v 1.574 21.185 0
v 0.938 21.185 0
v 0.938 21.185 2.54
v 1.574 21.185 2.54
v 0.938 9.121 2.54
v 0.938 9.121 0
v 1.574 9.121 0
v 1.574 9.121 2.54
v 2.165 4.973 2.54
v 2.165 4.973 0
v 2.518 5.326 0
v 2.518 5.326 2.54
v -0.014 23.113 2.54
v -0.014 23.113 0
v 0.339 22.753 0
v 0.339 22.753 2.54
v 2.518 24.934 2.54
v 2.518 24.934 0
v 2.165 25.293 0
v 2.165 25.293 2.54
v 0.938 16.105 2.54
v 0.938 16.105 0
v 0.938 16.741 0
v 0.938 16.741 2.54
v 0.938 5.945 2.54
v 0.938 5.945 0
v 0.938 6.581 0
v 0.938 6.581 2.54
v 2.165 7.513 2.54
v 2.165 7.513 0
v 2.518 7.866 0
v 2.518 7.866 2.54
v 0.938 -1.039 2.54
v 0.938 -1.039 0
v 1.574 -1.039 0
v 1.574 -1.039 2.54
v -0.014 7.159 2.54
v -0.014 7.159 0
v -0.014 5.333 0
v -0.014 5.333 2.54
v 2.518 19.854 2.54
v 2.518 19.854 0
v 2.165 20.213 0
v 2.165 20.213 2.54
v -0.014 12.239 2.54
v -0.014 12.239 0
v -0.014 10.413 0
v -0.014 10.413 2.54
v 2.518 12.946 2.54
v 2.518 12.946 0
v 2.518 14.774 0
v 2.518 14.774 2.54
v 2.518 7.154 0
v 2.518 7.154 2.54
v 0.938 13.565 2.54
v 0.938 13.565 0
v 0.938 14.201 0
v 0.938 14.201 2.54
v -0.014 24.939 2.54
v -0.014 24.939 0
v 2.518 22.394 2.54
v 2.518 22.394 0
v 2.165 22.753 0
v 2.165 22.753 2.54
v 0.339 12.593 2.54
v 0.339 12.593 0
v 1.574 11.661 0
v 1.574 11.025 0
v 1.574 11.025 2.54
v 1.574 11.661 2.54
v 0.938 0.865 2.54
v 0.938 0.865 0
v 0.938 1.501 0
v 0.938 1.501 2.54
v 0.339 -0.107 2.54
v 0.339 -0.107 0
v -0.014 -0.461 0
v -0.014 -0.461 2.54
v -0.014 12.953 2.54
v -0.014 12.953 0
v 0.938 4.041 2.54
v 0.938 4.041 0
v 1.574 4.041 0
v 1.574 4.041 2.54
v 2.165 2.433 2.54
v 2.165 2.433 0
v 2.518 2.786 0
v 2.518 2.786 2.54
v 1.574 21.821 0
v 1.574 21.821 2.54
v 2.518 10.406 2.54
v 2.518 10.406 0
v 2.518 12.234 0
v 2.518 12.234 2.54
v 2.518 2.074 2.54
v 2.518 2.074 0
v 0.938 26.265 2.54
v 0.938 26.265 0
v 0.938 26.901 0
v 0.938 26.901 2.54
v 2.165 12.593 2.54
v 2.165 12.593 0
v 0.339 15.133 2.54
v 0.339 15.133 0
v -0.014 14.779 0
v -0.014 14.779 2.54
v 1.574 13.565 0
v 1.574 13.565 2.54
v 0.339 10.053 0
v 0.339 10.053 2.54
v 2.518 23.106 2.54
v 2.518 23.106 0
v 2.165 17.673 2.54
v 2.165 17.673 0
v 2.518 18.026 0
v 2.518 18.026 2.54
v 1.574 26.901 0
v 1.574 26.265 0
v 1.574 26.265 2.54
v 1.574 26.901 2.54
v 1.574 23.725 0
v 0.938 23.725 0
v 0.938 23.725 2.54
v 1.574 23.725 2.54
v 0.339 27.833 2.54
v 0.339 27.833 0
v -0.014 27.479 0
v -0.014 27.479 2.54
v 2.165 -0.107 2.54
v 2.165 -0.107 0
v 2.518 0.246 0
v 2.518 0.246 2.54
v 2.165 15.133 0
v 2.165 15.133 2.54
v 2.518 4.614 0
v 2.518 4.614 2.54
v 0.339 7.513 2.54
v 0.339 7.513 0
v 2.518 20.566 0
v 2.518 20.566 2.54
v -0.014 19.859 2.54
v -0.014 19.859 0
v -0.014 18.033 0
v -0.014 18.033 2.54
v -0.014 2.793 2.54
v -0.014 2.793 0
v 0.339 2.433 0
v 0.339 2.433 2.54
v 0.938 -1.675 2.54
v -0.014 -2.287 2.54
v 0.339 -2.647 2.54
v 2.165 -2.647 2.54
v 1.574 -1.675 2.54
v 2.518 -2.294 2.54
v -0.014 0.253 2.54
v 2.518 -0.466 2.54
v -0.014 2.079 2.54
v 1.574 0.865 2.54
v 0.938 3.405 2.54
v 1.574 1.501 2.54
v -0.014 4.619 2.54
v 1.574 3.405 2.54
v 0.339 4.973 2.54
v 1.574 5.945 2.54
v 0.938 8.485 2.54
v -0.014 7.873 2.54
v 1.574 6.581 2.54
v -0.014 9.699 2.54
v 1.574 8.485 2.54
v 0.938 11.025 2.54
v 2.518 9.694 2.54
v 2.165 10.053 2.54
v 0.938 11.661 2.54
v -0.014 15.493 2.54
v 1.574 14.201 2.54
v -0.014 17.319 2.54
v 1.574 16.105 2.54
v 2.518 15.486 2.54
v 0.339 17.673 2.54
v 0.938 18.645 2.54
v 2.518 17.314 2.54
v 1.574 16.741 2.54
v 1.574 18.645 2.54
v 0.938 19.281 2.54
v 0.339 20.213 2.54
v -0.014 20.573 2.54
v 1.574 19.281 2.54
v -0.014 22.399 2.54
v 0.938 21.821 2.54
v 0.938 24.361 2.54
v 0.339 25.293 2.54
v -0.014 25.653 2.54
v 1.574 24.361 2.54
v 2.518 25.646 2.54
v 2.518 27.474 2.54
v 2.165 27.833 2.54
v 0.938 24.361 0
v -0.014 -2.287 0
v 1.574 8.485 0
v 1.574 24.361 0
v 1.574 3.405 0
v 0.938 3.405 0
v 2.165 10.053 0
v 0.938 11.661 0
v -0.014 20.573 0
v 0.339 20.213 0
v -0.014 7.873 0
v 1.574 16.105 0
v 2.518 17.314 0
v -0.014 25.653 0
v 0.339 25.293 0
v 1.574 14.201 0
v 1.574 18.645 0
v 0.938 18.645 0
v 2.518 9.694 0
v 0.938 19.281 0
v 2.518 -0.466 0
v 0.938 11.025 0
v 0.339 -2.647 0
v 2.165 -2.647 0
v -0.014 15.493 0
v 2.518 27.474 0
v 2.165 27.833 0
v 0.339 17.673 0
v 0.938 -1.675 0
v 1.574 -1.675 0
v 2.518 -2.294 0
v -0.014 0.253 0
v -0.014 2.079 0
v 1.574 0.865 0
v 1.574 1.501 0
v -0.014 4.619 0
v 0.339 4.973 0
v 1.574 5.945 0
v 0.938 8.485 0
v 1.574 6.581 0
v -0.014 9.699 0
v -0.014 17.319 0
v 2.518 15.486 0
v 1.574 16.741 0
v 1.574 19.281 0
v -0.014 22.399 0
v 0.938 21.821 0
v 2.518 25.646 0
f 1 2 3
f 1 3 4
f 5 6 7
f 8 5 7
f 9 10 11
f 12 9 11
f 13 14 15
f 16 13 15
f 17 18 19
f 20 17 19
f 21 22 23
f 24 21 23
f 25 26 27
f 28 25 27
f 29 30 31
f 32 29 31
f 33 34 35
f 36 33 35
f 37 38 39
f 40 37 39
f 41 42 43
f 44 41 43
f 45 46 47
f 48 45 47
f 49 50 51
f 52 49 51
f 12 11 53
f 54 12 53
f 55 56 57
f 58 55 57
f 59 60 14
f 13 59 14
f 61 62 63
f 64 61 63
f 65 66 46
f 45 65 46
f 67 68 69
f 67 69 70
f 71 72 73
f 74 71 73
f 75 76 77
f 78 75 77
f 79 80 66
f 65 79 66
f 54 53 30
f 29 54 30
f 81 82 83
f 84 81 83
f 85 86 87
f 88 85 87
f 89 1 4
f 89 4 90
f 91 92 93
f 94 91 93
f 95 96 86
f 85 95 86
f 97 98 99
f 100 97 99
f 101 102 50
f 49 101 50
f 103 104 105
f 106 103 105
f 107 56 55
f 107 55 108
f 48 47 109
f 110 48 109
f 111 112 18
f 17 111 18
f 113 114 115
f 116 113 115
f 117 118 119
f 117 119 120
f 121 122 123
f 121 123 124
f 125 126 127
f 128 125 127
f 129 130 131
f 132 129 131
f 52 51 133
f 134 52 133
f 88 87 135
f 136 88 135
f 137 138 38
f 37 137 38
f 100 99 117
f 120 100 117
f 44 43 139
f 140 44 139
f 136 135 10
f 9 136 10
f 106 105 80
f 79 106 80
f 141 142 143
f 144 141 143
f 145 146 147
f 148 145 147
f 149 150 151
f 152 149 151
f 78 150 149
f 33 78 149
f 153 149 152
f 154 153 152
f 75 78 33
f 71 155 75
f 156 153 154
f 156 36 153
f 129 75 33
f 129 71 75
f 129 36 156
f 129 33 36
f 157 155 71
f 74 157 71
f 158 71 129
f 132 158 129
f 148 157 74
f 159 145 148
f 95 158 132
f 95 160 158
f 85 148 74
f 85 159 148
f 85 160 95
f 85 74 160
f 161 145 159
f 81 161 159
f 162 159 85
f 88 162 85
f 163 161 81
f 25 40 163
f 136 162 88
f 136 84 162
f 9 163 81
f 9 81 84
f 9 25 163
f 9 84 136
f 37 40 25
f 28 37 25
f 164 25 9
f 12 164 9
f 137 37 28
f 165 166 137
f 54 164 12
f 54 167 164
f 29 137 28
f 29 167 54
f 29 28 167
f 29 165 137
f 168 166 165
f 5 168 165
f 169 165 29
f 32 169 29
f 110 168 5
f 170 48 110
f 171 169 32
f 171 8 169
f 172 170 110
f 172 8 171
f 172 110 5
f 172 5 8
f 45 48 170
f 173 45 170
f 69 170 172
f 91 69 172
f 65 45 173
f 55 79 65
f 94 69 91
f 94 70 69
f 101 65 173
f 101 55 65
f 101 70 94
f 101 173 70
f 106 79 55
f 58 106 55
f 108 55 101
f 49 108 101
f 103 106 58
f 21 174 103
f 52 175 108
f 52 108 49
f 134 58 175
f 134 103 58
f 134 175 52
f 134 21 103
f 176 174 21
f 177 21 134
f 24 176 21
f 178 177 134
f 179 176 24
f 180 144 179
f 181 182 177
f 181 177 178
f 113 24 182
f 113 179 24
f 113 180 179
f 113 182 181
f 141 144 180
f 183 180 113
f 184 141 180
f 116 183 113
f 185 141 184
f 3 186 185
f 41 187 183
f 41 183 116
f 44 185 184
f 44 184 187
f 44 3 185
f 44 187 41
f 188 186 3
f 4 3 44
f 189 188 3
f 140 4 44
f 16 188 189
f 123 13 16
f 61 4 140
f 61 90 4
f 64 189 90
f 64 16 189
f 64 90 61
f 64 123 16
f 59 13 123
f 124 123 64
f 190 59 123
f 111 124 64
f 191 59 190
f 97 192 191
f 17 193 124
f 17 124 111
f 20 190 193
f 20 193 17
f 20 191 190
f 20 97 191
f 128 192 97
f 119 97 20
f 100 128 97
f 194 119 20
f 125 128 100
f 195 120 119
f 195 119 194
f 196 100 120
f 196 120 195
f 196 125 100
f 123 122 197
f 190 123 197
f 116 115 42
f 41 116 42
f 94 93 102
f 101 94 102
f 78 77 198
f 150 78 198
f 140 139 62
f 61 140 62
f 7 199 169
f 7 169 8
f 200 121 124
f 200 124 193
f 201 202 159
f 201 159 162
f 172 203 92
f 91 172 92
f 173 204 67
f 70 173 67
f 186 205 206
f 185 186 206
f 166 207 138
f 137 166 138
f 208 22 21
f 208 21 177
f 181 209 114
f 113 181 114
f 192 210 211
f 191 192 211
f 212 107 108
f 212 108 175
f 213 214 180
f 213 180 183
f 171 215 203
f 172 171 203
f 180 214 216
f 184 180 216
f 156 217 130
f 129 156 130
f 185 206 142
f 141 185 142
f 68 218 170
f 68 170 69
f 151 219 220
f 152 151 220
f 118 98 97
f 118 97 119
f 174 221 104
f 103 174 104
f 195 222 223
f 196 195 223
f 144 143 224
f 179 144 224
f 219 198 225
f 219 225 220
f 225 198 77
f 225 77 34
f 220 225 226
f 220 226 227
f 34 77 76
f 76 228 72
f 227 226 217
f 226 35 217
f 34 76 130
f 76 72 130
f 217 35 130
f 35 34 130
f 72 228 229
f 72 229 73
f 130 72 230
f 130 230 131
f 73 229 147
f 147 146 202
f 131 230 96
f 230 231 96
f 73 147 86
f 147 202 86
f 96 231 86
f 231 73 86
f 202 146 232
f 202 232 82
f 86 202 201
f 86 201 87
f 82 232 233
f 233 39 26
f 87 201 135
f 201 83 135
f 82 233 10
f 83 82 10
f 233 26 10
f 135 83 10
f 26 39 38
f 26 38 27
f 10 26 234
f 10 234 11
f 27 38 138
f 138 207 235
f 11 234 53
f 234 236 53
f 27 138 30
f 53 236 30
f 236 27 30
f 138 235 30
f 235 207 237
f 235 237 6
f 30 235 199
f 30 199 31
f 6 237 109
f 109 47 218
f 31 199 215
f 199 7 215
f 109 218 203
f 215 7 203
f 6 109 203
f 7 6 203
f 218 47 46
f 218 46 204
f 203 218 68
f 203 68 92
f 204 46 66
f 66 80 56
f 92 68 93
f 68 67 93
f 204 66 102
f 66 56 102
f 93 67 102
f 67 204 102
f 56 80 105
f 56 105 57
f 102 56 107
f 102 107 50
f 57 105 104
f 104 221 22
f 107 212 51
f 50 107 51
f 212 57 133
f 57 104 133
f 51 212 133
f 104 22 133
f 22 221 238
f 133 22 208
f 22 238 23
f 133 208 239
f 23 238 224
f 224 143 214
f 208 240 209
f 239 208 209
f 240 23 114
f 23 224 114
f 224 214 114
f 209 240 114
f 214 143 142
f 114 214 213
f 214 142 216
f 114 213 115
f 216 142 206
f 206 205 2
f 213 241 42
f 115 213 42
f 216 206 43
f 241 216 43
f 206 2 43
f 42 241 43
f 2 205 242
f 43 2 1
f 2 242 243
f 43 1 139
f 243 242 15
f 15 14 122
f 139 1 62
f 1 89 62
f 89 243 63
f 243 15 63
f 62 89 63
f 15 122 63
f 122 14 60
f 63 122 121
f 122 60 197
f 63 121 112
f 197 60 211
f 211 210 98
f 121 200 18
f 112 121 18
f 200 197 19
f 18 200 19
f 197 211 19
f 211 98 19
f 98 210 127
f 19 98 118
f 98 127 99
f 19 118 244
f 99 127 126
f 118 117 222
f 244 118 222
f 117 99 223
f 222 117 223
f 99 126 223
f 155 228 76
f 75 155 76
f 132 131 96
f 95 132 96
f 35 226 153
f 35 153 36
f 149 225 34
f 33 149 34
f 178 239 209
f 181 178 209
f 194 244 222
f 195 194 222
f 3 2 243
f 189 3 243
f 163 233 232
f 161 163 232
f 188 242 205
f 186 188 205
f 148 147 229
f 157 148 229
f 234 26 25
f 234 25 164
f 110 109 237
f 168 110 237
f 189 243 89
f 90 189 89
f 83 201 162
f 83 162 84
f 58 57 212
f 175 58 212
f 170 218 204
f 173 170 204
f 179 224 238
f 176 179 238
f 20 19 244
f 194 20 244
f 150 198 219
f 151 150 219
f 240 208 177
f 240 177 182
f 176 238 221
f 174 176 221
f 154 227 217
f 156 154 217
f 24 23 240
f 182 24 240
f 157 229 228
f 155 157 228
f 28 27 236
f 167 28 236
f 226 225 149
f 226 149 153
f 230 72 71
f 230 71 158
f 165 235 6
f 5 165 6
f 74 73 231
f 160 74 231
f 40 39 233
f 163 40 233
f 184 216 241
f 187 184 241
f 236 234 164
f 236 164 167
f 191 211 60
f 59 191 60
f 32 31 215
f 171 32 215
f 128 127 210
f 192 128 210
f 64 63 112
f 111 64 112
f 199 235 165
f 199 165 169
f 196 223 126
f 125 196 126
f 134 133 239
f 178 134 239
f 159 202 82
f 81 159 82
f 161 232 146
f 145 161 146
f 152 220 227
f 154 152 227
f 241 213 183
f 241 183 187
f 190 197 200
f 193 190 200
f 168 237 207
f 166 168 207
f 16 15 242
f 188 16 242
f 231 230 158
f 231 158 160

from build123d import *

# Parameters (mm, degrees)
PIN_DRAWING_W       = 0.636
PIN_DRAWING_H       = 0.636
BOSS_EXTRUDE1_DEPTH = 2.54


with BuildPart() as part:
    # pin_drawing → Boss-Extrude1 (new body)
    with BuildSketch(Plane.XY):
        Polygon((-0.014377737, 2.079116284), (-0.014377737, 0.25314904), (0.339175653, -0.107330326), (-0.014377737, -0.460883716), (-0.014377737, -2.28685096), (0.339175653, -2.647330326), (2.164719162, -2.647330326), (2.518272553, -2.293776935), (2.518272553, -0.46648), (2.164719162, -0.107330326), (2.518272553, 0.246223065), (2.518272553, 2.07352), (2.164719162, 2.432669674), (2.518272553, 2.786223065), (2.518272553, 4.61352), (2.164719162, 4.972669674), (2.518272553, 5.326223065), (2.518272553, 7.15352), (2.164719162, 7.512669674), (2.518272553, 7.866223065), (2.518272553, 9.69352), (2.164719162, 10.052669674), (2.518272553, 10.406223065), (2.518272553, 12.23352), (2.164719162, 12.592669674), (2.518272553, 12.946223065), (2.518272553, 14.77352), (2.164719162, 15.132669674), (2.518272553, 15.486223065), (2.518272553, 17.31352), (2.164719162, 17.672669674), (2.518272553, 18.026223065), (2.518272553, 19.85352), (2.164719162, 20.212669674), (2.518272553, 20.566223065), (2.518272553, 22.39352), (2.164719162, 22.752669674), (2.518272553, 23.106223065), (2.518272553, 24.93352), (2.164719162, 25.292669674), (2.518272553, 25.646223065), (2.518272553, 27.47352), (2.164719162, 27.832669674), (0.339175653, 27.832669674), (-0.014377737, 27.479116284), (-0.014377737, 25.65314904), (0.339175653, 25.292669674), (-0.014377737, 24.939116284), (-0.014377737, 23.11314904), (0.339175653, 22.752669674), (-0.014377737, 22.399116284), (-0.014377737, 20.57314904), (0.339175653, 20.212669674), (-0.014377737, 19.859116284), (-0.014377737, 18.03314904), (0.339175653, 17.672669674), (-0.014377737, 17.319116284), (-0.014377737, 15.49314904), (0.339175653, 15.132669674), (-0.014377737, 14.779116284), (-0.014377737, 12.95314904), (0.339175653, 12.592669674), (-0.014377737, 12.239116284), (-0.014377737, 10.41314904), (0.339175653, 10.052669674), (-0.014377737, 9.699116284), (-0.014377737, 7.87314904), (0.339175653, 7.512669674), (-0.014377737, 7.159116284), (-0.014377737, 5.33314904), (0.339175653, 4.972669674), (-0.014377737, 4.619116284), (-0.014377737, 2.79314904), (0.339175653, 2.432669674), align=None)
        with Locations((1.256122263, -1.357330326)):
            Rectangle(PIN_DRAWING_W, PIN_DRAWING_H, mode=Mode.SUBTRACT)
        with Locations((1.256122263, 1.182669674)):
            Rectangle(PIN_DRAWING_W, PIN_DRAWING_H, mode=Mode.SUBTRACT)
        with Locations((1.256122263, 3.722669674)):
            Rectangle(PIN_DRAWING_W, PIN_DRAWING_H, mode=Mode.SUBTRACT)
        with Locations((1.256122263, 6.262669674)):
            Rectangle(PIN_DRAWING_W, PIN_DRAWING_H, mode=Mode.SUBTRACT)
        with Locations((1.256122263, 8.802669674)):
            Rectangle(PIN_DRAWING_W, PIN_DRAWING_H, mode=Mode.SUBTRACT)
        with Locations((1.256122263, 11.342669674)):
            Rectangle(PIN_DRAWING_W, PIN_DRAWING_H, mode=Mode.SUBTRACT)
        with Locations((1.256122263, 13.882669674)):
            Rectangle(PIN_DRAWING_W, PIN_DRAWING_H, mode=Mode.SUBTRACT)
        with Locations((1.256122263, 16.422669674)):
            Rectangle(PIN_DRAWING_W, PIN_DRAWING_H, mode=Mode.SUBTRACT)
        with Locations((1.256122263, 18.962669674)):
            Rectangle(PIN_DRAWING_W, PIN_DRAWING_H, mode=Mode.SUBTRACT)
        with Locations((1.256122263, 21.502669674)):
            Rectangle(PIN_DRAWING_W, PIN_DRAWING_H, mode=Mode.SUBTRACT)
        with Locations((1.256122263, 24.042669674)):
            Rectangle(PIN_DRAWING_W, PIN_DRAWING_H, mode=Mode.SUBTRACT)
        with Locations((1.256122263, 26.582669674)):
            Rectangle(PIN_DRAWING_W, PIN_DRAWING_H, mode=Mode.SUBTRACT)
    extrude(amount=BOSS_EXTRUDE1_DEPTH)


solid = part.part
